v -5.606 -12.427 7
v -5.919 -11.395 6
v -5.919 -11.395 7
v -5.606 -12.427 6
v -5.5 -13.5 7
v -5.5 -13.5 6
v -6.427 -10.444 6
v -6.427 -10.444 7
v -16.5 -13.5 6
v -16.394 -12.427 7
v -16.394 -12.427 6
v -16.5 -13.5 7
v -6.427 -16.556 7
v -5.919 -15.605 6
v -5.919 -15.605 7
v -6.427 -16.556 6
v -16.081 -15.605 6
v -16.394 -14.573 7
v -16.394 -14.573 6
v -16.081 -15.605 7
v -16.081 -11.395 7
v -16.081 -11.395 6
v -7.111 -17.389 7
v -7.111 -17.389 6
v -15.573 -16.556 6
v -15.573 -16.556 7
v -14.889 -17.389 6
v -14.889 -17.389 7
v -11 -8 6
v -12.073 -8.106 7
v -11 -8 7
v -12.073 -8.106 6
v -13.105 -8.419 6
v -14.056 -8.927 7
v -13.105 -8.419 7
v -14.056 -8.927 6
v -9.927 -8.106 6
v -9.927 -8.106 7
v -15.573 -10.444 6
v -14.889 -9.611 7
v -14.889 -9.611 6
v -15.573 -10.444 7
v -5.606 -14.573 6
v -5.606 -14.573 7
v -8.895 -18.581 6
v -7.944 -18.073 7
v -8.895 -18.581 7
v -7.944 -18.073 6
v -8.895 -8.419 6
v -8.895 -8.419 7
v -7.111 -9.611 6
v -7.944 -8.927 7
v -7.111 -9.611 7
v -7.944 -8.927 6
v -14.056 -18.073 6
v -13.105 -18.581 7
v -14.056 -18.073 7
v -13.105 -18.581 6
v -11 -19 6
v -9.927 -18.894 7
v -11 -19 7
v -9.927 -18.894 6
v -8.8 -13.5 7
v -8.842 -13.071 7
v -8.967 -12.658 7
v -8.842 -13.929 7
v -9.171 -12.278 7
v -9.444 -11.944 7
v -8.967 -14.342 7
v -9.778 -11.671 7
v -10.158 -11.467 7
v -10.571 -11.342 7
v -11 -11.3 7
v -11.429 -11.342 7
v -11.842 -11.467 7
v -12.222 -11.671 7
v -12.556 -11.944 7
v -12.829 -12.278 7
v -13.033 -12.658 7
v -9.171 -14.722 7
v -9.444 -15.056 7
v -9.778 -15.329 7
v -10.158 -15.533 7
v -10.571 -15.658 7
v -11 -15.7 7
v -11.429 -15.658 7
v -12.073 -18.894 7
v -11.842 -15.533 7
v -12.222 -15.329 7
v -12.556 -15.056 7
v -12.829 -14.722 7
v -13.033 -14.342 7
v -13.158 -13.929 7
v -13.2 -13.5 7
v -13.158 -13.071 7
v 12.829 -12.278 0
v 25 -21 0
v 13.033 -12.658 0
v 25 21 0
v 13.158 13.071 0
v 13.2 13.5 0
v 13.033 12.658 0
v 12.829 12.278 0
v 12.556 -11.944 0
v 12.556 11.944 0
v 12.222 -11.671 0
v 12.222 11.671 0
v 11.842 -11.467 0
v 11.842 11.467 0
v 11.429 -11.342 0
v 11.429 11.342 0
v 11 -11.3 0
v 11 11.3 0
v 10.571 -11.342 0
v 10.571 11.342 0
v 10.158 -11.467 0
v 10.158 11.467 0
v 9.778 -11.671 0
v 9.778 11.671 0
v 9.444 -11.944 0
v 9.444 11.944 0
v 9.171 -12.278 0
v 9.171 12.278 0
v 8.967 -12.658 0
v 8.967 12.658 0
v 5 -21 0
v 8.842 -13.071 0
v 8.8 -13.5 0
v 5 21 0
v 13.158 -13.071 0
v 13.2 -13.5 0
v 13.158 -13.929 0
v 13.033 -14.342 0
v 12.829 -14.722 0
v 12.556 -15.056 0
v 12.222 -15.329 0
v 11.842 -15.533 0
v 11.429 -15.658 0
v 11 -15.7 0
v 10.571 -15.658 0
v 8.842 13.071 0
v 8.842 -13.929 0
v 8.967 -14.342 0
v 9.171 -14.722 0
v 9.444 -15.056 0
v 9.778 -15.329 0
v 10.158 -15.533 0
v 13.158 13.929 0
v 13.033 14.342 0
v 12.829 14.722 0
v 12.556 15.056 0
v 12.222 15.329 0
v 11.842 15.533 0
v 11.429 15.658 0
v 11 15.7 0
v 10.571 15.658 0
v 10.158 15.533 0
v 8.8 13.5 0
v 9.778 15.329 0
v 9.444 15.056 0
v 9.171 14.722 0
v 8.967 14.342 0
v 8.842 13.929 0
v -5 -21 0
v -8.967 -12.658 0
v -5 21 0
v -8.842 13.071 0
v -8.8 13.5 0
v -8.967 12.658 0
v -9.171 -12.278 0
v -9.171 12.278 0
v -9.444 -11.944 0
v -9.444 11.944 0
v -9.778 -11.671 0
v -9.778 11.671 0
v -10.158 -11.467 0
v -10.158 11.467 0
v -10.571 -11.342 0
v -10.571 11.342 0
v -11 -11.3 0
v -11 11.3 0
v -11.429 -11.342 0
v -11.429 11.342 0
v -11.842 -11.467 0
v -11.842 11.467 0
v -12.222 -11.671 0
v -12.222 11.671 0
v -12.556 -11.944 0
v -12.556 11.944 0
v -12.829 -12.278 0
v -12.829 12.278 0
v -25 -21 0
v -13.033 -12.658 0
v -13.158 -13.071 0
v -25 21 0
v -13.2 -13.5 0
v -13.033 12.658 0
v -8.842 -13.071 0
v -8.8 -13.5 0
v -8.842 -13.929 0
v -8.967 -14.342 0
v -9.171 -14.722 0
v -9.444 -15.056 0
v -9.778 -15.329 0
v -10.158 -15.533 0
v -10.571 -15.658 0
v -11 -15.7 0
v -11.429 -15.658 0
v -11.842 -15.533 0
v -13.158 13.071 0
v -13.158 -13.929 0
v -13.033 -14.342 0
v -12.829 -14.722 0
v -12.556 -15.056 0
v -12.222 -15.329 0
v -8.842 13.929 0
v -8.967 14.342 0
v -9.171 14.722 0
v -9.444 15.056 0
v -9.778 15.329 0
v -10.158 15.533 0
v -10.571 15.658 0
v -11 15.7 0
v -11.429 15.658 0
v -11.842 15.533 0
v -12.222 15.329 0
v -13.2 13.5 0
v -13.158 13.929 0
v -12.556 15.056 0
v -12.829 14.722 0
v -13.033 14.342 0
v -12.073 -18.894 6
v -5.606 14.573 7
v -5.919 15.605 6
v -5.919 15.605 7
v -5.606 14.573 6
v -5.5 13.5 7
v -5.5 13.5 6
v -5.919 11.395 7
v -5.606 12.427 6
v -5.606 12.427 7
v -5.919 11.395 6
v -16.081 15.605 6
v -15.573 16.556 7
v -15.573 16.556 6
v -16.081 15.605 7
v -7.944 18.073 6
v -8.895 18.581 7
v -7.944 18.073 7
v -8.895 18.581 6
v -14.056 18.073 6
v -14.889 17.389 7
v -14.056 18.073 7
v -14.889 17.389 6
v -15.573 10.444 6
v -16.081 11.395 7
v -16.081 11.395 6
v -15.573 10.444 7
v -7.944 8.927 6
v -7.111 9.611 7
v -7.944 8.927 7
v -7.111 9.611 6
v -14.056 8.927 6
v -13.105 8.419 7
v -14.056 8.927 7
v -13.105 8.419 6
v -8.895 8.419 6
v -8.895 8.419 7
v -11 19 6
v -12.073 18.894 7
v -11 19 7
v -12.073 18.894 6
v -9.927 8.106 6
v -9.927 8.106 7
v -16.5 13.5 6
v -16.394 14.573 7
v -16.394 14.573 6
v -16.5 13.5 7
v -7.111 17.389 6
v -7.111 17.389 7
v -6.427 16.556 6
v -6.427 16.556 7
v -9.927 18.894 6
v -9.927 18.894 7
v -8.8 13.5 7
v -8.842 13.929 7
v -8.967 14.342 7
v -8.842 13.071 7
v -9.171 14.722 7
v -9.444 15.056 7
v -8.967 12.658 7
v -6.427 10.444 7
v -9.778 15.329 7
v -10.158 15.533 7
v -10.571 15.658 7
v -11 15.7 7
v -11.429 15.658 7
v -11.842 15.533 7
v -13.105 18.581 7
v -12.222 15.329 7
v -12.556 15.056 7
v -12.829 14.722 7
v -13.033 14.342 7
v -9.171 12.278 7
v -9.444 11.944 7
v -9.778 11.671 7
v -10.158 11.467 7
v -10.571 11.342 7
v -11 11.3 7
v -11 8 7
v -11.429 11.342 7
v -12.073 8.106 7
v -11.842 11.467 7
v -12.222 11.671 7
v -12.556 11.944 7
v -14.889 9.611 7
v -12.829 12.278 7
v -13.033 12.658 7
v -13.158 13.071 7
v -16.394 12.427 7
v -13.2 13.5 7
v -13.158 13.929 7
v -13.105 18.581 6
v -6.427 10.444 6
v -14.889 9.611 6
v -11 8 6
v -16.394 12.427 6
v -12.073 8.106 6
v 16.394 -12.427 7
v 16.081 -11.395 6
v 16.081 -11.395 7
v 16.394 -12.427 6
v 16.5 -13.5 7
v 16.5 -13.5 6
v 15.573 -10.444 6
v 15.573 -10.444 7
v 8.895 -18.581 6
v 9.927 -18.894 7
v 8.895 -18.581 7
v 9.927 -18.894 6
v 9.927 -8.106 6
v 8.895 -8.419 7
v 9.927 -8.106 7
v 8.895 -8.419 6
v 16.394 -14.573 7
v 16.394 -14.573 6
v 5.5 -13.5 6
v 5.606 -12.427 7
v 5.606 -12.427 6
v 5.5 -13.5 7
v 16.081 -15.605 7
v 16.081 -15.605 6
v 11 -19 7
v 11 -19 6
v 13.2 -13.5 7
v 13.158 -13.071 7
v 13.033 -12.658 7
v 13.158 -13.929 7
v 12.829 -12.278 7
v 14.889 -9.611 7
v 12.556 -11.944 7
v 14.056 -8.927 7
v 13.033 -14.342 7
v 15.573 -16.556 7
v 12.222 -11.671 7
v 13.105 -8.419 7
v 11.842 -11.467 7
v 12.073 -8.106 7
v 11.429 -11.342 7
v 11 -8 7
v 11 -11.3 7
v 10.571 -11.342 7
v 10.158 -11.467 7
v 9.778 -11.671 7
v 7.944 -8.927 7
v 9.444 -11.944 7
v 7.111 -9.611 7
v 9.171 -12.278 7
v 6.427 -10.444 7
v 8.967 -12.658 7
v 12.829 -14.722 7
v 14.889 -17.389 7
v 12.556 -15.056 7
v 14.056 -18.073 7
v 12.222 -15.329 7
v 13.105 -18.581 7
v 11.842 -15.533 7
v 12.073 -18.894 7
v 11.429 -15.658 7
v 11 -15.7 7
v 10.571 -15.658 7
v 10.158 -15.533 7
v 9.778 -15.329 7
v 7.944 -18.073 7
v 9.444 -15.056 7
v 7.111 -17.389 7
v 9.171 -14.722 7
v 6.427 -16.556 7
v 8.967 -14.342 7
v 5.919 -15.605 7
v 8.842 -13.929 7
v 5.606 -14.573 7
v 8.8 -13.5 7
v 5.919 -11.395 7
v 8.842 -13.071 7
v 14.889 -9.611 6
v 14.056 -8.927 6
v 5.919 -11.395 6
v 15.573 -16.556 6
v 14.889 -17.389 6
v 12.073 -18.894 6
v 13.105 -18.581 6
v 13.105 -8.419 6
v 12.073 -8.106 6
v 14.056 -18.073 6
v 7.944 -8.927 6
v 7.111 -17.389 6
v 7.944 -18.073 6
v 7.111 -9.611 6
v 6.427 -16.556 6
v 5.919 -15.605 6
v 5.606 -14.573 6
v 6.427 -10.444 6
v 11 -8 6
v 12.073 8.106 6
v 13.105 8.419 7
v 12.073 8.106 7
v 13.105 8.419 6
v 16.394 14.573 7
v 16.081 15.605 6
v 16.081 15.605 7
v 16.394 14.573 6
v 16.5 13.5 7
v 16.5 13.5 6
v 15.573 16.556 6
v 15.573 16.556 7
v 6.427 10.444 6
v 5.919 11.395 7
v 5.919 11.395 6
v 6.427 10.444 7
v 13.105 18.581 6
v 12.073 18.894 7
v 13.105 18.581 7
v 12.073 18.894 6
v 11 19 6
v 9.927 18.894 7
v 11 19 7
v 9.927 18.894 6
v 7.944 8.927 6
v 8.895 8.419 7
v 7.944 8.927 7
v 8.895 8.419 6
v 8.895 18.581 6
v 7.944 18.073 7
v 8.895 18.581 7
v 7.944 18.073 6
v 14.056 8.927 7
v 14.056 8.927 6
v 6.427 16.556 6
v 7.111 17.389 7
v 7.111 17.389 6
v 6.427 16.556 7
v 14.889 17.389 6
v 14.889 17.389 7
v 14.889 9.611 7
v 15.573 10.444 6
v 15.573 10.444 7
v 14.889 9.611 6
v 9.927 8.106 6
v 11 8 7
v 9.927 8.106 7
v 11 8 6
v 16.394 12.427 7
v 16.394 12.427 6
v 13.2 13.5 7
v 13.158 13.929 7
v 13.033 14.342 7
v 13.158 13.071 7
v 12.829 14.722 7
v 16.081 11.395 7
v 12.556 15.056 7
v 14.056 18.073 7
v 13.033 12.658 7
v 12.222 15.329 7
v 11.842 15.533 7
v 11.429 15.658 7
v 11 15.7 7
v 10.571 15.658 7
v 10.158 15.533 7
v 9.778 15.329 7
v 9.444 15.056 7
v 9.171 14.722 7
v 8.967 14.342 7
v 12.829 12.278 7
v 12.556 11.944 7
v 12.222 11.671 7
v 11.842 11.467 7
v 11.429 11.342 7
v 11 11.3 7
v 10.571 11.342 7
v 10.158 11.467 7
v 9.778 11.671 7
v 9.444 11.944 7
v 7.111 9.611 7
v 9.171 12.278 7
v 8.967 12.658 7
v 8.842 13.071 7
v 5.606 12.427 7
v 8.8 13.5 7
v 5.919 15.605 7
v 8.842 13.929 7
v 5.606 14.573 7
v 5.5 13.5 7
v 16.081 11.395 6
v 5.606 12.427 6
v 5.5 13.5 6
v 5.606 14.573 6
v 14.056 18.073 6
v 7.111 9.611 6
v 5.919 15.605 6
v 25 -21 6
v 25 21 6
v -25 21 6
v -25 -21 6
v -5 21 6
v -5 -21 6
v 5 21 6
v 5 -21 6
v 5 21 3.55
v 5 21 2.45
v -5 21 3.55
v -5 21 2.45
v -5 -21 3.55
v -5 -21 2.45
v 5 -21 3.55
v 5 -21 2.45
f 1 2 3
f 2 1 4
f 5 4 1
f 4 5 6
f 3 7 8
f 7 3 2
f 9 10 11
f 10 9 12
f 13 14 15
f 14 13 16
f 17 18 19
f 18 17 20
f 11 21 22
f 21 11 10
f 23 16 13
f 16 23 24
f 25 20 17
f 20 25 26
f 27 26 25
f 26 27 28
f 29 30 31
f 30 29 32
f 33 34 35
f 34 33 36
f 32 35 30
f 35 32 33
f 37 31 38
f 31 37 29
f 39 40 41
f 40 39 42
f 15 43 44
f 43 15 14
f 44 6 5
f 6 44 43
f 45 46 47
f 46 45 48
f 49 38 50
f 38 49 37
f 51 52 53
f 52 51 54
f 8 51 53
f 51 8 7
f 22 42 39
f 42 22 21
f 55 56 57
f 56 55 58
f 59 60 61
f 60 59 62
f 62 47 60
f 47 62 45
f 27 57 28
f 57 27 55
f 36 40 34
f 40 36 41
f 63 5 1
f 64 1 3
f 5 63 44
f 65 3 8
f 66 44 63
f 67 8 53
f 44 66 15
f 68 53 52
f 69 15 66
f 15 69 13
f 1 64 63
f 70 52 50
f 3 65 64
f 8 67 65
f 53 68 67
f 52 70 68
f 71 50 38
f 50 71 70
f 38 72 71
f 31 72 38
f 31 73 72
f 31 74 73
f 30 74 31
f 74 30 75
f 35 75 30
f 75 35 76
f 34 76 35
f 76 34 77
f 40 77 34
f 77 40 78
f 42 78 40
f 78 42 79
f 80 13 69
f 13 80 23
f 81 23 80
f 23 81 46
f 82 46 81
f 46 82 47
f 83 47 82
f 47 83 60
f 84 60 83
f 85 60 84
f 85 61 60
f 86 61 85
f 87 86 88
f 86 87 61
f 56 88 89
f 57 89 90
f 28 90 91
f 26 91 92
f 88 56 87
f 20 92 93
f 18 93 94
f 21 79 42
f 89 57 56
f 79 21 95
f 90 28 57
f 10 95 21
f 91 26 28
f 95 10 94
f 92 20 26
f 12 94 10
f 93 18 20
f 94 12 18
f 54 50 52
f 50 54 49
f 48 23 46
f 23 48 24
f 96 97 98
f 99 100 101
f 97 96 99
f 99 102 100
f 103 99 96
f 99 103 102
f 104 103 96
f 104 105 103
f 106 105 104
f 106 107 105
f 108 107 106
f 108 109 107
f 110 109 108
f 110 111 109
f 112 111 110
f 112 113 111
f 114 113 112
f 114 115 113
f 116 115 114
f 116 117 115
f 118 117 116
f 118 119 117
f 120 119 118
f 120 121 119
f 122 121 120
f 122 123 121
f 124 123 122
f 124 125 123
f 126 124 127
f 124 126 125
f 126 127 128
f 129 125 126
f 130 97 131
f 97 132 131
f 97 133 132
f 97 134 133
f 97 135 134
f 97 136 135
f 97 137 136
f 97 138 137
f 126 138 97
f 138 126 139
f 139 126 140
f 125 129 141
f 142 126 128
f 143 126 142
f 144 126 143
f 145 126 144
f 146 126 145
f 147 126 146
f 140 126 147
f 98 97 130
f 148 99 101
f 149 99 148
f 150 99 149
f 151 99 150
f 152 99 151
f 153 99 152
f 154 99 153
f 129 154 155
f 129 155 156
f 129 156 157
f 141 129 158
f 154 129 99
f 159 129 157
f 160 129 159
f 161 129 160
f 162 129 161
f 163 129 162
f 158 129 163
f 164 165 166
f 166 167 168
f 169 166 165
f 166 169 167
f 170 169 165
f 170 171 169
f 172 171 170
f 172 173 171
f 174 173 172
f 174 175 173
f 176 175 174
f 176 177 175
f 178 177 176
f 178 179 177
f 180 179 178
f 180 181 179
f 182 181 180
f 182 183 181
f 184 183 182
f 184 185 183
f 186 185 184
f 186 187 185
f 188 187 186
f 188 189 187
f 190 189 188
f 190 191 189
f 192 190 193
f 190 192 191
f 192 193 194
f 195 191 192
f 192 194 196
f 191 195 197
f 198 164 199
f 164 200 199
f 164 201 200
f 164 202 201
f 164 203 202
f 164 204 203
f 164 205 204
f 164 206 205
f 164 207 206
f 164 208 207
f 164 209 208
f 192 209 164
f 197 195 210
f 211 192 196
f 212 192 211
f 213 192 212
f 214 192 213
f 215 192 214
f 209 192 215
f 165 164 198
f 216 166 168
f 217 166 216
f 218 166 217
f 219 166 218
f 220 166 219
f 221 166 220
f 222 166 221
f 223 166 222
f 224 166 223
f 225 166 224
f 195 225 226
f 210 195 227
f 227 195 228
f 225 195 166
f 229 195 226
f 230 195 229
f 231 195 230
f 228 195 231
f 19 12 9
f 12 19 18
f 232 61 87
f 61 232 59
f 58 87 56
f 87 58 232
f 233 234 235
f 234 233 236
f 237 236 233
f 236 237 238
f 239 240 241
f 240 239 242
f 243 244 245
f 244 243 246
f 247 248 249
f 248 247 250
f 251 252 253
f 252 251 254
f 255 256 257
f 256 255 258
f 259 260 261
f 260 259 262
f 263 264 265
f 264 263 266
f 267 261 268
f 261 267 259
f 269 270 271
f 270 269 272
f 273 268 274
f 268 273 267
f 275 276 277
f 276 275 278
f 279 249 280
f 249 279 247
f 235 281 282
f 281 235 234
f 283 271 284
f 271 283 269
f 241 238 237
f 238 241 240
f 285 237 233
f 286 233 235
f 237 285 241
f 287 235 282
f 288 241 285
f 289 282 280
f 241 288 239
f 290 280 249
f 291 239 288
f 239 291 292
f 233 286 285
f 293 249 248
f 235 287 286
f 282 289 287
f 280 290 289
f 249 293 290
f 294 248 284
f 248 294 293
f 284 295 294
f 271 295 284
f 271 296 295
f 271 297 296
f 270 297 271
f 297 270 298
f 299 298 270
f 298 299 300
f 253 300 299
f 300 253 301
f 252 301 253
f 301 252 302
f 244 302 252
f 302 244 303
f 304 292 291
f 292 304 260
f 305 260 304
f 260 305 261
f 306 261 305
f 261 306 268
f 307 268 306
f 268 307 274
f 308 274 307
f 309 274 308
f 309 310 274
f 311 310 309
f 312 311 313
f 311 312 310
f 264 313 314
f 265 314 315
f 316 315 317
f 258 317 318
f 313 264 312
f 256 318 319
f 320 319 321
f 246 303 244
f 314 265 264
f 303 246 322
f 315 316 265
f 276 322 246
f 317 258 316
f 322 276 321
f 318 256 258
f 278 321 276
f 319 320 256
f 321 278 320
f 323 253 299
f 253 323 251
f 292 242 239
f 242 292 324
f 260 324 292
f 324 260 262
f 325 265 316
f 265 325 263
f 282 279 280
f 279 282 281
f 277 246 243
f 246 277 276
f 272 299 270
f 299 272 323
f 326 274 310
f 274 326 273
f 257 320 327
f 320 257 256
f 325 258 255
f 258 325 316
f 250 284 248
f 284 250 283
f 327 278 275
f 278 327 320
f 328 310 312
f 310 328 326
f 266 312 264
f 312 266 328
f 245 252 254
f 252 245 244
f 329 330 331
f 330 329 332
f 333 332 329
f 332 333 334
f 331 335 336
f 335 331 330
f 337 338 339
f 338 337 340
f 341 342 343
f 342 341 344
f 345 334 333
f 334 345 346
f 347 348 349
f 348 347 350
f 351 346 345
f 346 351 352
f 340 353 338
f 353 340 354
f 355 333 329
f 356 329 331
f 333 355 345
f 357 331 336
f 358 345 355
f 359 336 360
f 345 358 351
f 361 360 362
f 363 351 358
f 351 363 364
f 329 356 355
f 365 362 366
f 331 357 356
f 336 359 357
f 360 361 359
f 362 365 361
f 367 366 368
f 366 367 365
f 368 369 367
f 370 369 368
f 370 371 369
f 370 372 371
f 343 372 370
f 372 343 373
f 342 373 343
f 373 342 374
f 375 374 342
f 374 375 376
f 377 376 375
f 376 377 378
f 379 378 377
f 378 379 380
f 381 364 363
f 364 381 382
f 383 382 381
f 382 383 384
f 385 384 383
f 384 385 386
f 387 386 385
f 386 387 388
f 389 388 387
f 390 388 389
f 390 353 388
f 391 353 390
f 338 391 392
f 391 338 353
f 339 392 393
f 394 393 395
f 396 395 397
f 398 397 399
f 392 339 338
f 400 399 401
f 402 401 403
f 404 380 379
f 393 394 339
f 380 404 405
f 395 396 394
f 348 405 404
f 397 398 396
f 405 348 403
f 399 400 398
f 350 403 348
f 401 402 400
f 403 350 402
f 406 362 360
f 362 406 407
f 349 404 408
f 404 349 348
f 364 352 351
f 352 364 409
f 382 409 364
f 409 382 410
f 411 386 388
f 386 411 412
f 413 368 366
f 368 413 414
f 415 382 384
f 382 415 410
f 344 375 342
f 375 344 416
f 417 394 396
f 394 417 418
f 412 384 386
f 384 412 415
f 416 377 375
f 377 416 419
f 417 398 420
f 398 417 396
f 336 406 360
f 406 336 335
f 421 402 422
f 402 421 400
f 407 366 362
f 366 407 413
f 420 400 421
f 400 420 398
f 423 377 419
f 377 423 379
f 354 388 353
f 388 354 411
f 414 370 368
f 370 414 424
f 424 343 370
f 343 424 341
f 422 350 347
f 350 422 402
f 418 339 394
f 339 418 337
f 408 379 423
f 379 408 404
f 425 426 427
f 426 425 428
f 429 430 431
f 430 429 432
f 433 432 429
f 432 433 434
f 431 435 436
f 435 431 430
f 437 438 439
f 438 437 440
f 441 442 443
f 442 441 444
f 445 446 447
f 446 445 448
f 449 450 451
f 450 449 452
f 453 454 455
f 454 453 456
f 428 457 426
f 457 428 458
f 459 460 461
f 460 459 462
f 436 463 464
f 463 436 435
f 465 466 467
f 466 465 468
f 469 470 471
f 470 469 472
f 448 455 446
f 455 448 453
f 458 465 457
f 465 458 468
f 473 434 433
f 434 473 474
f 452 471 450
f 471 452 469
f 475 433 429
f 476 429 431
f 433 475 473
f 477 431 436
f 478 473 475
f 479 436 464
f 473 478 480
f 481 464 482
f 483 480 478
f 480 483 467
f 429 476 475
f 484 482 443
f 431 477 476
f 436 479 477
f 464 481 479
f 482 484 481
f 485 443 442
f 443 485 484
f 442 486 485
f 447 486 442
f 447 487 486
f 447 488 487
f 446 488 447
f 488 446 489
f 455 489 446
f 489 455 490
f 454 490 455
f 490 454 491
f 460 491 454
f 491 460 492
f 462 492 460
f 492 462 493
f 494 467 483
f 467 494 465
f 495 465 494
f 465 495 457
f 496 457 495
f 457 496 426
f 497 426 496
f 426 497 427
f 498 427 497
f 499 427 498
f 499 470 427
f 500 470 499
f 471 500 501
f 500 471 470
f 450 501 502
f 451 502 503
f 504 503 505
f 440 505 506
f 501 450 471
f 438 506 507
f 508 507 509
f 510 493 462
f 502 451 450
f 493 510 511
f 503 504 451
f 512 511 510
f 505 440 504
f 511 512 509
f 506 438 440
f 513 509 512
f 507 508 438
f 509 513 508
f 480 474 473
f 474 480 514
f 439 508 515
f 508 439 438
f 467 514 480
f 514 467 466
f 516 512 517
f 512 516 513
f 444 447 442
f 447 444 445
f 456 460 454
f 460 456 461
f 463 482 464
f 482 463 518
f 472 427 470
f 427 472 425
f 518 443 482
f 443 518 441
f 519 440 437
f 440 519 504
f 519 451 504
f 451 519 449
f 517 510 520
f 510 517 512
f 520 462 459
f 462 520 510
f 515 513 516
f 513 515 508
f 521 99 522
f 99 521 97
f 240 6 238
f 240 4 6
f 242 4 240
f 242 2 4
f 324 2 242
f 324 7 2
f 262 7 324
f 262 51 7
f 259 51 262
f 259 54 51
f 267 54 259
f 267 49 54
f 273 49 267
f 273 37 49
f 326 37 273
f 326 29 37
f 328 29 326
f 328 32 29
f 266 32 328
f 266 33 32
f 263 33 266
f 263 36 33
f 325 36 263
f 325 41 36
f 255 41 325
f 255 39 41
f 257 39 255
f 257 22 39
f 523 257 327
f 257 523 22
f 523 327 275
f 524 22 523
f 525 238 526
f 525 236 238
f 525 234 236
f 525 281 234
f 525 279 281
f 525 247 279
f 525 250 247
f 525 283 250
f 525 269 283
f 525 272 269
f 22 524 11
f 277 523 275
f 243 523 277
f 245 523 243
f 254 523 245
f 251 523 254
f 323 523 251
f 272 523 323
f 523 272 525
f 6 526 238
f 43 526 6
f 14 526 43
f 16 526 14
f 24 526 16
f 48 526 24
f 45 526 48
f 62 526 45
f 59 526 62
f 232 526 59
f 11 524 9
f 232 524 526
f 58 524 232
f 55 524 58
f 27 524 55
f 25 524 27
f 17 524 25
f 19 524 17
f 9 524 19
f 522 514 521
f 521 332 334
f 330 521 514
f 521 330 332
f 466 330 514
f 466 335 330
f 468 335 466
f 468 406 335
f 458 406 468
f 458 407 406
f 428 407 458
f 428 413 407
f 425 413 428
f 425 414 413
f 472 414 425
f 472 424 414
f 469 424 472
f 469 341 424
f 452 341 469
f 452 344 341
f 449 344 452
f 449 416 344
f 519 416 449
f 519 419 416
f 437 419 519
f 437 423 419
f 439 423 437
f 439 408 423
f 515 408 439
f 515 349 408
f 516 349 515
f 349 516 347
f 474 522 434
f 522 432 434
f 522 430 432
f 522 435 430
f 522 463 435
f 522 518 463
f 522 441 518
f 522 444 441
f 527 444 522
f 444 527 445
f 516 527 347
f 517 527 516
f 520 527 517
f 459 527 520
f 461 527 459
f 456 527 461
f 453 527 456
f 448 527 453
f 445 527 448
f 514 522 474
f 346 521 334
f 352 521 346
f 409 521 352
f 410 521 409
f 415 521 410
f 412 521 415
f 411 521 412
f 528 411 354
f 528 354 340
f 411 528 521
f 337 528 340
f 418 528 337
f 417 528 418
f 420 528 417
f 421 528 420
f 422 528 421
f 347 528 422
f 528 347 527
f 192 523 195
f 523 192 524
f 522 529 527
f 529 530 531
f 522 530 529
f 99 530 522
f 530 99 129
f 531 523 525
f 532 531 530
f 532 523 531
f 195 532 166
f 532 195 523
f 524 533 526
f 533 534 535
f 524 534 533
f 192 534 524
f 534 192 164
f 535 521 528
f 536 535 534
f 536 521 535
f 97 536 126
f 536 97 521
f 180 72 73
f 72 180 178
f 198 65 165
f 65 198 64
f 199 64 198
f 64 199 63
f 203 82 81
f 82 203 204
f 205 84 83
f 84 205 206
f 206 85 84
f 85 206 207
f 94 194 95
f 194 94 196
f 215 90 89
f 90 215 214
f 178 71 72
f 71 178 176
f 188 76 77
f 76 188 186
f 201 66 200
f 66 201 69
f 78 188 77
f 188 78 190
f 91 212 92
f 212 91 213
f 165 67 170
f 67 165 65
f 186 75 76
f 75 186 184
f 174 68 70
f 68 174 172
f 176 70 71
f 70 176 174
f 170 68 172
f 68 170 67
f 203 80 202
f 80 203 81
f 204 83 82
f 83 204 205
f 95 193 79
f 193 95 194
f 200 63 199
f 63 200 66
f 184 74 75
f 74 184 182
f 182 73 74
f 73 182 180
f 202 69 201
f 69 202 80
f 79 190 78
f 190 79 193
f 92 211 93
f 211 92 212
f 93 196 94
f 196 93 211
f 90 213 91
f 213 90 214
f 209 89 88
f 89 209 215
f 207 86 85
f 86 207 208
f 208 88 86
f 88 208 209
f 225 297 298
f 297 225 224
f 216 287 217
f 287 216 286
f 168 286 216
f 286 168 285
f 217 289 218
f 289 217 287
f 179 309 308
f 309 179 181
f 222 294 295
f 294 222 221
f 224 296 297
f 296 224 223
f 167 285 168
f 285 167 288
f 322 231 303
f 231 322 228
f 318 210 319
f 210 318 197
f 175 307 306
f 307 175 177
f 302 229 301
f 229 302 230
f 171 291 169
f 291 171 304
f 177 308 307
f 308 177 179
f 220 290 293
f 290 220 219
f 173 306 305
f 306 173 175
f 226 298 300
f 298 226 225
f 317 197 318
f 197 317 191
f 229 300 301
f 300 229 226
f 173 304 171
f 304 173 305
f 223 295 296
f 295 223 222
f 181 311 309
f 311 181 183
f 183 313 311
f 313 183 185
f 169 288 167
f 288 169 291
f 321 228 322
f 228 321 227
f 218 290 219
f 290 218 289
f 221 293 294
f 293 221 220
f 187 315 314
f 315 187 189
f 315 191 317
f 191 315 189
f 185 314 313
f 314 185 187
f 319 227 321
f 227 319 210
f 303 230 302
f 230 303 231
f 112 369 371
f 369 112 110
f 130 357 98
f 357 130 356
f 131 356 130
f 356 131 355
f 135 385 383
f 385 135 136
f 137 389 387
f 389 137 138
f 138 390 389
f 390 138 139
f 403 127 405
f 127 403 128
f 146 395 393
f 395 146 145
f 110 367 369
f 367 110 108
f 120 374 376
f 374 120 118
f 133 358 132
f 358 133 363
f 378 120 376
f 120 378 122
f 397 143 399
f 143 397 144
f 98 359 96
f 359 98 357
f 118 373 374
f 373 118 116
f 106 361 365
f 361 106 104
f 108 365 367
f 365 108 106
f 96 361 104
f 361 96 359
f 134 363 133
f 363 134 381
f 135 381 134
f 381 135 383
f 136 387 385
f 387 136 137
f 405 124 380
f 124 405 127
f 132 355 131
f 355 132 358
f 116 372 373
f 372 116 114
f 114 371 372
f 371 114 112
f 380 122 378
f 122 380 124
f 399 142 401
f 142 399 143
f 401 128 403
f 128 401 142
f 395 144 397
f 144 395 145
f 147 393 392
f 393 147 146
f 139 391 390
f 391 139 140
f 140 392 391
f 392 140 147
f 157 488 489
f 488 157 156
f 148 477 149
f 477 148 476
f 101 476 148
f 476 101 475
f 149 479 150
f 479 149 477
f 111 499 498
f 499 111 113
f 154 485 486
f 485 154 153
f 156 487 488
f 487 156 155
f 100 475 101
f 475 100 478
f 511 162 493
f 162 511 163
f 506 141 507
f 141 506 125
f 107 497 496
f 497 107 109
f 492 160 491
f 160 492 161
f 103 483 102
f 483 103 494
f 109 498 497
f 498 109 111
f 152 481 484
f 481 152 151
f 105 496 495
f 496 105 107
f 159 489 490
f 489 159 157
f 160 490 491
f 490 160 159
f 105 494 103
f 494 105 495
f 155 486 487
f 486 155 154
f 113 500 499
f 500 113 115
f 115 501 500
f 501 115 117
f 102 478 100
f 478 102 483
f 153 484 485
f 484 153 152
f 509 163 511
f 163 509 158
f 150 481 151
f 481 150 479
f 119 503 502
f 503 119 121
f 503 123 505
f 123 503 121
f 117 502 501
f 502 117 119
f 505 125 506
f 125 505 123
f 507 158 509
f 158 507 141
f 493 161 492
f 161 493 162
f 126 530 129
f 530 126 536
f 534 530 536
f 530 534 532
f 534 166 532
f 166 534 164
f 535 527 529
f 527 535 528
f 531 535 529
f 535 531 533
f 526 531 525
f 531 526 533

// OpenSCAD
$fn = 32;

// ----------------------------------------------------------------------
// Living hinge: 50 x 42 mm plates, 1.1 mm flexible web
// ----------------------------------------------------------------------

// --- parameters (mm) ---
plate_len = 20;           // plate length outside the web
plate_w = 42;             // plate width
thick = 6;                // plate thickness
web_half = 5;             // half width of the flex band
web_t = 1.1;              // flexible web thickness
web_z = 2.45;             // web position inside the thickness
boss_d = 11;              // screw boss diameter
boss_h = 7;               // screw boss height
boss_x = 11;              // screw boss distance from the web
screw_d = 4.4;            // screw hole

difference() {
  union() {
    /* one flat strip, later thinned at the middle */
    translate([-25, -21, 0]) cube([50, 42, 6]);
    /* screw bosses, sunk 0.5 mm into the plates */
    for (sx = [-11, 11]) {
      for (sy = [-13.5, 13.5]) {
        translate([sx, sy, 0]) cylinder(h = boss_h, d = boss_d);
      }
    }
  }
  /* channel from below: leaves the web on top of it */
  translate([-5, -23.5, -2.5]) cube([10, 47, 4.95]);
  /* channel from above: thins the web down to web_t */
  translate([-5, -23.5, 3.55]) cube([10, 47, 4.95]);
  /* screw holes through the bosses */
  for (sx = [-11, 11]) {
    for (sy = [-13.5, 13.5]) {
      translate([sx, sy, -2.5]) cylinder(h = boss_h + 5, d = screw_d);
    }
  }
}
